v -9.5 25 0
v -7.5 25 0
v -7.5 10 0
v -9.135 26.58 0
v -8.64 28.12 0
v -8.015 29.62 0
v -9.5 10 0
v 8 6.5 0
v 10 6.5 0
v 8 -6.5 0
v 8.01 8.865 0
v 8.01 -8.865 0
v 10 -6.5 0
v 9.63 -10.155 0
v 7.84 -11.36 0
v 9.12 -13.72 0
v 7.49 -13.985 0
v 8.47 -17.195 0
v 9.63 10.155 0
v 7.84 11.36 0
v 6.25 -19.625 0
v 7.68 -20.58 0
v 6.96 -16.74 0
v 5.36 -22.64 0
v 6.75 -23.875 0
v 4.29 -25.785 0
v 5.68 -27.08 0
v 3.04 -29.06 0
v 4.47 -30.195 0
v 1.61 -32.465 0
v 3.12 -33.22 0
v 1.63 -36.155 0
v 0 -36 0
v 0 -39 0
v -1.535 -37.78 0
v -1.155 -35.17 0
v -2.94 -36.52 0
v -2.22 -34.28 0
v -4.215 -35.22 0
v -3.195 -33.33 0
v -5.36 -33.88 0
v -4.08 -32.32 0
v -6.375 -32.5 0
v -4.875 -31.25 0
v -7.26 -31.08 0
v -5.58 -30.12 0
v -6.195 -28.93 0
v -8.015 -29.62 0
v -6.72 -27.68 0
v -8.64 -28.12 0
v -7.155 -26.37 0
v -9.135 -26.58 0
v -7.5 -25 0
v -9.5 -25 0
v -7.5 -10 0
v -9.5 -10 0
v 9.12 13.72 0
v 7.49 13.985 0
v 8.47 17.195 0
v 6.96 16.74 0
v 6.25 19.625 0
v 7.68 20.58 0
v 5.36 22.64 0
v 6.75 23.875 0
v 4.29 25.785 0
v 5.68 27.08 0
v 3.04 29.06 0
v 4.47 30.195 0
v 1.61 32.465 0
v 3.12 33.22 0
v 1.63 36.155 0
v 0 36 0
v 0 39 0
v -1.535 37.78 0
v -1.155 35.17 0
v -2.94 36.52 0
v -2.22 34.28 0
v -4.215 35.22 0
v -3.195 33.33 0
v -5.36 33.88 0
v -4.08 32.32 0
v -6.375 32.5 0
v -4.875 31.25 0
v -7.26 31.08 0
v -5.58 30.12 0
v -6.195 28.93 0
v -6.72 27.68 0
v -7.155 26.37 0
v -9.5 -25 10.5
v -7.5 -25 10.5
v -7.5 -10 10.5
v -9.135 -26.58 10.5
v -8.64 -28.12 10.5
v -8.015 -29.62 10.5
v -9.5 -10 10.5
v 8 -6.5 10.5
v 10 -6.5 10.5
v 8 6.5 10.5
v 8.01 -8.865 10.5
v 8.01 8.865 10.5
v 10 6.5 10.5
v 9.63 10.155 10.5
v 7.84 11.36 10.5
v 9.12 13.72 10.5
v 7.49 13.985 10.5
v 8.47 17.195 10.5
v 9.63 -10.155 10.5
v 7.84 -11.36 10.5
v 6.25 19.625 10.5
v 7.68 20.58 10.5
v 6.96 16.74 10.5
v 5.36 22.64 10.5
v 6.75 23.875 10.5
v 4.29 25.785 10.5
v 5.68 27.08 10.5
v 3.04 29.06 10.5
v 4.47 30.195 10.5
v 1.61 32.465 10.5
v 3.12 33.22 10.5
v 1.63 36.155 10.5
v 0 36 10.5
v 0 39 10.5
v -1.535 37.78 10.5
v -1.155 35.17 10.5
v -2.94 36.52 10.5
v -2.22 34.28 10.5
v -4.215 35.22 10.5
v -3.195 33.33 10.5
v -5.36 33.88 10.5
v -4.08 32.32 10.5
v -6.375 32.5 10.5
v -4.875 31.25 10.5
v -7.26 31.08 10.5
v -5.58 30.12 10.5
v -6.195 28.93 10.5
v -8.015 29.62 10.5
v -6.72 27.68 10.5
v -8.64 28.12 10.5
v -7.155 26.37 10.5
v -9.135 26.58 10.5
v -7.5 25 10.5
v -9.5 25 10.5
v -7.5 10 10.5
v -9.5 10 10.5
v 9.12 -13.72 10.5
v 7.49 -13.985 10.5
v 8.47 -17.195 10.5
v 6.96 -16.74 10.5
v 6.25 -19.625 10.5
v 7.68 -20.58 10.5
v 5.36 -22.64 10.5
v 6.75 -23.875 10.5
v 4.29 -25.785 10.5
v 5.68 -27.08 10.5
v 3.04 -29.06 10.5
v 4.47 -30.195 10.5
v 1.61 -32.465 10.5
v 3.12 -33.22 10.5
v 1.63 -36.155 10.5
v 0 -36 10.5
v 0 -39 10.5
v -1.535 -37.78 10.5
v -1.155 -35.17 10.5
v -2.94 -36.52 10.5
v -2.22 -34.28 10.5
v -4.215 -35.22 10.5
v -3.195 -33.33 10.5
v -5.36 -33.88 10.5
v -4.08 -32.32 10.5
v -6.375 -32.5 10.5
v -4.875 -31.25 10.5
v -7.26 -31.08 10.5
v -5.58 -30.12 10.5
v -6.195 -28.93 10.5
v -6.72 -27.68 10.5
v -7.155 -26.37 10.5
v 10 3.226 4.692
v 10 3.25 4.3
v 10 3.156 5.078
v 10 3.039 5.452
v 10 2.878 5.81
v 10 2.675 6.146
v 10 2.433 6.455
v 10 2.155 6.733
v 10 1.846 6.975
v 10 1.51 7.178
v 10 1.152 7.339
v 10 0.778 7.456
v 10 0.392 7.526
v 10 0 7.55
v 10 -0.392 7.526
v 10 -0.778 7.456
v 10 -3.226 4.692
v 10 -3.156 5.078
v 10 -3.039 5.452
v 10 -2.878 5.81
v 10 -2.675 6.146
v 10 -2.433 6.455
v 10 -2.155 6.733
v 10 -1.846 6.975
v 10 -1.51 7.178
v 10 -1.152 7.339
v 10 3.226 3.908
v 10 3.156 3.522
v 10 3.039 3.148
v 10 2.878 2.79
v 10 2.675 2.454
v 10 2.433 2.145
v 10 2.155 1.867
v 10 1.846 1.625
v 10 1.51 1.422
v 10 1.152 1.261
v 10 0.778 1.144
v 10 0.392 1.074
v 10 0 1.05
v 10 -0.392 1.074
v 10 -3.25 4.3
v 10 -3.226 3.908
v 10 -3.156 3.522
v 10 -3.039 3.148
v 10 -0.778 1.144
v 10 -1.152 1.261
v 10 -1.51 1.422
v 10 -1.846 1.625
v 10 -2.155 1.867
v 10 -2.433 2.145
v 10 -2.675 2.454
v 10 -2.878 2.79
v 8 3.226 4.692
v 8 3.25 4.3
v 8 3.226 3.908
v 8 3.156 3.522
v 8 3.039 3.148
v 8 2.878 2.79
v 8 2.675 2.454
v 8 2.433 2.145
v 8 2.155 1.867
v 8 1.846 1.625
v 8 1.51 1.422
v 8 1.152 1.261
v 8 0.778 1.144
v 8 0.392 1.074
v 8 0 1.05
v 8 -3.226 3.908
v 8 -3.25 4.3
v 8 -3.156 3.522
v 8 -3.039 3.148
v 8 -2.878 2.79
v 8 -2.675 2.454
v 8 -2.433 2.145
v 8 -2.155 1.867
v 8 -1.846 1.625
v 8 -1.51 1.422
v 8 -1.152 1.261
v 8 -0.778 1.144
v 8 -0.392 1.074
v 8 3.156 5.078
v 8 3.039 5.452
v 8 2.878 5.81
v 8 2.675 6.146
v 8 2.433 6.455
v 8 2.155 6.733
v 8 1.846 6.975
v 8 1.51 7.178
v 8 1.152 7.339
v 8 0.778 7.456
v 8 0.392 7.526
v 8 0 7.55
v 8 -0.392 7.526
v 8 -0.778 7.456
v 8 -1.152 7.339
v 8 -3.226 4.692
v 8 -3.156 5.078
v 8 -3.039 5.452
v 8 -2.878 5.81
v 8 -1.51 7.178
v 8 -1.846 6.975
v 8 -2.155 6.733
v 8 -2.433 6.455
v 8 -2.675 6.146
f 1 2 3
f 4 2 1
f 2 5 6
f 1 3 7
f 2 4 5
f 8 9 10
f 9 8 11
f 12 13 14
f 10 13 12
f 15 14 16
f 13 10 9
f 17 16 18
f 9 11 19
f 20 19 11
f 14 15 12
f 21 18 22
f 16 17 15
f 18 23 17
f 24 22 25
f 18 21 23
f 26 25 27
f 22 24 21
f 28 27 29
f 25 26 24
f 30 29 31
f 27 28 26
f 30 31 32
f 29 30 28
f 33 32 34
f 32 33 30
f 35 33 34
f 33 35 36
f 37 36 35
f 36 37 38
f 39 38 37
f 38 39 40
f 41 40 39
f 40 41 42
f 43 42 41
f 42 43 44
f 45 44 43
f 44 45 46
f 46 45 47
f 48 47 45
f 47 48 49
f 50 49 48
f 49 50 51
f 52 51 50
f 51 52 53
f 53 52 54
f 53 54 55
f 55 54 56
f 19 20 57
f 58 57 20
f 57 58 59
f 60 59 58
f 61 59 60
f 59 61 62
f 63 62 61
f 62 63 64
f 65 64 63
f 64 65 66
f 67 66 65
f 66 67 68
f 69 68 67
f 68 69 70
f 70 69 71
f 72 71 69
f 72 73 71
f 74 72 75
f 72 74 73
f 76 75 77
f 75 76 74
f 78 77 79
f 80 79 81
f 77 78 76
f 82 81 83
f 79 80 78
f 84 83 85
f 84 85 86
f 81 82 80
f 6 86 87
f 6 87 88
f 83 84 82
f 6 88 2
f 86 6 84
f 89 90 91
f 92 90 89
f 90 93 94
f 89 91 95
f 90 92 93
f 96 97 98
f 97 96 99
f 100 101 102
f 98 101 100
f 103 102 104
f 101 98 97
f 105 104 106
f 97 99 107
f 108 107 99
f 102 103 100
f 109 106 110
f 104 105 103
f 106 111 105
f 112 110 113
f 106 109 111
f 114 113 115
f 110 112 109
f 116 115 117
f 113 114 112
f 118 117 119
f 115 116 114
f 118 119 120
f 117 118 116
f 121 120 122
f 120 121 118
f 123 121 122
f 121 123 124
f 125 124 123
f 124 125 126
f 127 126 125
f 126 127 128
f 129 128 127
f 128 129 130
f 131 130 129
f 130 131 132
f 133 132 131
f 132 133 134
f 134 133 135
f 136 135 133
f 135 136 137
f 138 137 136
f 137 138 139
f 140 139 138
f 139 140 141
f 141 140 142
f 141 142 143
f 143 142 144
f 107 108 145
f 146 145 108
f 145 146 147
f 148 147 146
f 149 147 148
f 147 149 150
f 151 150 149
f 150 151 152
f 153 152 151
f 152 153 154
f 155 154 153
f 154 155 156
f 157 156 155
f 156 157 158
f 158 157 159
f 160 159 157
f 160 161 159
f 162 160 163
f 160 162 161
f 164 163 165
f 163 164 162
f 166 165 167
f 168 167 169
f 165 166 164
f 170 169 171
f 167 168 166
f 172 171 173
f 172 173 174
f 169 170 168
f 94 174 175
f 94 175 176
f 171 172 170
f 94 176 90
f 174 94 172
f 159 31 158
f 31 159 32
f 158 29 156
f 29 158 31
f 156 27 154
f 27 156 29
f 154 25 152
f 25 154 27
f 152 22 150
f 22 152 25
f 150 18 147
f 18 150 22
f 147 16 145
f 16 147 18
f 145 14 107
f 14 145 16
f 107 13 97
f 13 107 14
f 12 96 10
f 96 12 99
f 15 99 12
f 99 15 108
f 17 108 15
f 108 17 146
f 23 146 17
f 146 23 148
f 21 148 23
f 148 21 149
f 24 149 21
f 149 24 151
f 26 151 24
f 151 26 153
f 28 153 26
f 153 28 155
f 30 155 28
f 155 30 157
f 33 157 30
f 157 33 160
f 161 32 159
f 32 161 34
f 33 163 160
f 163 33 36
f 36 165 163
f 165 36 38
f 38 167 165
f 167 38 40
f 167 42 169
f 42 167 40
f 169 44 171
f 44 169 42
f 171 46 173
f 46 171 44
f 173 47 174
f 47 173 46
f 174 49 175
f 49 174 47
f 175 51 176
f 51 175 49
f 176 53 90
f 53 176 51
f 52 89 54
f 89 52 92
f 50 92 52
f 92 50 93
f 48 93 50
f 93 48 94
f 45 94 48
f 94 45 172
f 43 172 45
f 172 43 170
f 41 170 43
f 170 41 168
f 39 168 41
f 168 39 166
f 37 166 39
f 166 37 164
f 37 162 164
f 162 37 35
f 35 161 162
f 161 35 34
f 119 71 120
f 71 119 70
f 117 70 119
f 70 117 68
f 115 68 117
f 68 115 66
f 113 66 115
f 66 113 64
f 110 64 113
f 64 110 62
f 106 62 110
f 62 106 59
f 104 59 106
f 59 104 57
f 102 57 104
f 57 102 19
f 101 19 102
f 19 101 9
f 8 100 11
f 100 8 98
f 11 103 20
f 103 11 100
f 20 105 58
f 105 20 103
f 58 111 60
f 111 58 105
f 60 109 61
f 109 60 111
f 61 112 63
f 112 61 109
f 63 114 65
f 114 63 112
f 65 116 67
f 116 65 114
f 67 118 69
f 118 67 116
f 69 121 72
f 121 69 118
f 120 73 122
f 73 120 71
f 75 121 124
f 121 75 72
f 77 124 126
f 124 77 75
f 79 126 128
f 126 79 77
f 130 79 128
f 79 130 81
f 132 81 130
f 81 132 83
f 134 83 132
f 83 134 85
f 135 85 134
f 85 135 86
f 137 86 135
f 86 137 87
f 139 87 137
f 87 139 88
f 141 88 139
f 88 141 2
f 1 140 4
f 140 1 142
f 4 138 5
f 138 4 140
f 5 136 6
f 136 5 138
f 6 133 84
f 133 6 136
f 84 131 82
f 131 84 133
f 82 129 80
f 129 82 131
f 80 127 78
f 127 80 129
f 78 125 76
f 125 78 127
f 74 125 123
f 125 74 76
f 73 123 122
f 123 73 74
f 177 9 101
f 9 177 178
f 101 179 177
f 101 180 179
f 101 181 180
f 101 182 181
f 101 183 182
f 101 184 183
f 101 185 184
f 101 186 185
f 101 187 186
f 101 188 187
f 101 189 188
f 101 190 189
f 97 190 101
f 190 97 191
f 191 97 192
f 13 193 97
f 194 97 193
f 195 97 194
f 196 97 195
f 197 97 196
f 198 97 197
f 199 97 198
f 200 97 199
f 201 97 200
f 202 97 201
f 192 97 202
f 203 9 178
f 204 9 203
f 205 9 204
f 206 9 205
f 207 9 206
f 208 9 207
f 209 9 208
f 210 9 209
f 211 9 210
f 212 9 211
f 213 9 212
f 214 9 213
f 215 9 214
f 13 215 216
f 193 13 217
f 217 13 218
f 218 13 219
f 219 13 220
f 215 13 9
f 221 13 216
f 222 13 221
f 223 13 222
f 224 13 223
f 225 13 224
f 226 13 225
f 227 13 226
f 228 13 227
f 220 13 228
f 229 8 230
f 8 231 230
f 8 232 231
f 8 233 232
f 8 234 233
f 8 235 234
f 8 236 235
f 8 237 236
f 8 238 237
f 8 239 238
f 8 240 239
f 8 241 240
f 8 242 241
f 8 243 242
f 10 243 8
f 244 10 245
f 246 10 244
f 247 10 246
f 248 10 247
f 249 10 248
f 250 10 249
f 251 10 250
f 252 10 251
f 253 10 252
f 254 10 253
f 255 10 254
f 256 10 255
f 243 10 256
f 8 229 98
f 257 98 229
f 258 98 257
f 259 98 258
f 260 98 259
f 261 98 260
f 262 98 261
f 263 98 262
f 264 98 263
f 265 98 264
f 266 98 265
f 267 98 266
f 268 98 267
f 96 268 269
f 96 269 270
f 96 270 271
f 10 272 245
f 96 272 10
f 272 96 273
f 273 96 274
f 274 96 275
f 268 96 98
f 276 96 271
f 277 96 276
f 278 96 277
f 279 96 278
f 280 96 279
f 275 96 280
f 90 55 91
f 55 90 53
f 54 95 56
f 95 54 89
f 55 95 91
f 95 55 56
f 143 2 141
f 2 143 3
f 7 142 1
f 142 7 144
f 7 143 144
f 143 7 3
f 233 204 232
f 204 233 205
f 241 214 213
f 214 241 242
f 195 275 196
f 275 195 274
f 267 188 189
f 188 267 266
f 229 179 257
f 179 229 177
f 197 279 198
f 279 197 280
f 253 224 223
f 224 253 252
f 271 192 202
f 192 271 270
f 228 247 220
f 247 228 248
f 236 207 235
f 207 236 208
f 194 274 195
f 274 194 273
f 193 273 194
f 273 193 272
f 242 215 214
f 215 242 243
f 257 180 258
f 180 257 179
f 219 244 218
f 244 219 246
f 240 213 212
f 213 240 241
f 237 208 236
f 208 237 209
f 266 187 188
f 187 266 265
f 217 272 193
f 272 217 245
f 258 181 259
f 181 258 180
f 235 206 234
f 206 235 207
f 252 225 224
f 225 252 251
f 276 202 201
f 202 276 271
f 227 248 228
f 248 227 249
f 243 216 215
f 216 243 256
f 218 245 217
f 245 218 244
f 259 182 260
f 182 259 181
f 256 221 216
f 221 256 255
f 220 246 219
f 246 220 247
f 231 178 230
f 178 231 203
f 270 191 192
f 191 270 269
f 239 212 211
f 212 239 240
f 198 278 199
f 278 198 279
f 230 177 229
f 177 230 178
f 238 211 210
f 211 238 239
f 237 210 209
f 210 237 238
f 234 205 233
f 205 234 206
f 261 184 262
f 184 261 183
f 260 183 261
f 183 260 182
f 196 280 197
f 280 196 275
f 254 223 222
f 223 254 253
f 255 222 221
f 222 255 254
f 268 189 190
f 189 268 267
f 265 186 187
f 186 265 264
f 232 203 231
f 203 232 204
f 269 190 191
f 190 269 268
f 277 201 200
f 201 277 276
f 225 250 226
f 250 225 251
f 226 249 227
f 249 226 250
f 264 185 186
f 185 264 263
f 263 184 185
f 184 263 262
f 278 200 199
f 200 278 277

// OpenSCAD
$fa = 1;
$fs = 0.4;

//import("viejo/rendija-fija.stl");
  
module base() {
  difference() {
    cylinder(r=45, h=4.8);
    // hueco     
    translate([0,-25,-5])
      cube([10,50,10]);
    // tornillos
    for(a=[-30,30,120,240])
      rotate(a+0)
        translate([36,0,0])
          cylinder(d=3.6,h=10,center=true);
    // guía cubo
    difference(){
      translate([29.5,-6.5,4.8])
        guia_cubo(-tolj,16,4.84,-0.02);  
      cylinder(r=45, h=0.9);
    }
  }
}

module pared_fija(largo,ancho1,ancho2,alto) {  
  rotate([90,0,0])
  linear_extrude(largo,center=true)
    polygon([[0,0],[-ancho1,0],
             [-ancho2,alto],[0,alto]]);
}

module guia(alto,largo,ancho,alfa){
  translate([0,0,4.8])
  rotate([90,0,90])
  let(ancho2=ancho+2*alto/tan(alfa))
    linear_extrude(largo)
      polygon([[0,0],[0,alto],
               [ancho2/2,alto],[ancho/2,0]]);
}

module rendija_fija () {
  base();
  pared_fija(76,11,3,21);
  translate([0,-38,0])
    guia(4.8,18,10,alfa);  
  translate([0,38,0])  
  mirror([0,1,0])
    guia(4.8,18,10,alfa);
}

module rendija_movil() {    
  let(largo=76-10,
      delta=2*4.8/tan(alfa),
      l1=largo/2-tolh,
      l2=(largo-delta)/2-tolh)
  difference () {
    union(){
      // pared
      translate([0,-largo/2+delta/2+tolh,0]) 
        cube([5,largo-delta-2*tolh,16.2]);
      // base
      rotate([0,90,0])
        linear_extrude(15.5)
          polygon([[0,-l1],[-4.8,-l2],[-4.8,l2],[0,l1]]);
      // pared tornillo
      translate([0,-25,0])                 
        cube([14,50,16.2]);        
      // tabiques      
      translate([1,22,0])
        cube([11,3,16.2]);
      translate([1,-25,0])
        cube([11,3,16.2]);
    }
  // agujero interno
  translate([5,-7,3])
    cube([5,14,20]);
  // agujero tornillo
  translate([9,0,10])
    rotate([0,90,0])
      cylinder(h=6,d=5);
  translate([9,-2.5,10])
    cube([6,5,20]);
  // agujero elástico
  translate([12.5,-25.5,4.8+.6])
      cube([2,17,15]);
  translate([12.5,25.5-17,4.8+.6])
      cube([2,17,15]);
    
  }
}

alfa=55;
tolh=0.4; // holgado
tolj=0.3;  // justo

module cubo () {  
  difference() {    
    union(){
      cube([14,13,16.2]);
      guia_cubo(0,14,4.8,0);  
    }
    translate([4.5,-3,5])
      cube([5,20,9.9]);
    translate([-3,13/2,10])
      rotate([0,90,0])
        cylinder(h=20,d=5);
    translate([5,5,-15-4.8+1.2])
      cube([30,30,30],center=true);
  }   
}

module guia_cubo(tol,ancho,alto,z){
  let(largo=13,
      delta=2*alto/tan(alfa),
      l1=largo/2-tol,
      l2=(largo+delta)/2-tol)
  translate([ancho,6.5,-z])
  rotate([0,-90,0])
  linear_extrude(ancho)
    polygon([[0,-l1],[-alto,-l2],[-alto,l2],[0,l1]]);
}

module todo(){
  rendija_fija();
  translate([0,0,4.8])  color("cyan") rendija_movil();
  translate([30,-6.5,4.8]) color("cyan") cubo();
  translate([20.1,0,10.5]) color("blue") elastico(2);
}

module elastico(ancho) {
  module cintas() {
    linear_extrude(10.5)
      polygon(concat(
          [for (t=[0:.1:1]) 
            bezier2([8+ancho,-6.5],[8.5,-25],[0,-39],t)],
          [[0,-35+ancho]],
          [for (t=[1:-.1:0]) 
            bezier2([8,-6.5],[8.5,-18],[0,-39+ancho*1.5],t)]
          ));
    linear_extrude(10.5)
      polygon(concat(
          [for (t=[0:.1:1]) 
            bezier2([-7.5-2,-25],[-8,-33],[0,-39],t)],
          [[0,-39+ancho*1.5]],
          [for (t=[1:-.1:0]) 
            bezier2([-7.5-2+ancho,-25],[-6,-32],[0,-39+ancho*1.5],t)]
          ));        
      }  
  difference () {
    union(){
      translate([8,-6.5,0])
        cube([ancho,13,10.5]);
      translate([-7.5-2,-25,0])
        cube([ancho,15,10.5]);
      translate([-7.5-2,25-15,0])
        cube([ancho,15,10.5]);
      cintas();
      mirror([0,1,0])
          cintas();
    }
    translate([-3,0,4.3])
      rotate([0,90,0])
        cylinder(h=20,d=6.5); 
  }
}

//translate([20.1,0,9]) color("blue") elastico(1.5);
//rendija_fija();
//rendija_movil();
//translate([30,-6.5,4.8]) color("cyan") cubo();
//cubo();
//todo();
elastico(2);

function bezier2(p0,p1,p2,t) =
  (1-t)^2*p0 + 2*t*(1-t)*p1 + t^2*p2;

function bezier3(p0,p1,p2,p3,t) =
  (1-t)^3*p0 + 3*t*(1-t)^2*p1 + 3*t*t*(1-t)*p2 + t^3*p3;
